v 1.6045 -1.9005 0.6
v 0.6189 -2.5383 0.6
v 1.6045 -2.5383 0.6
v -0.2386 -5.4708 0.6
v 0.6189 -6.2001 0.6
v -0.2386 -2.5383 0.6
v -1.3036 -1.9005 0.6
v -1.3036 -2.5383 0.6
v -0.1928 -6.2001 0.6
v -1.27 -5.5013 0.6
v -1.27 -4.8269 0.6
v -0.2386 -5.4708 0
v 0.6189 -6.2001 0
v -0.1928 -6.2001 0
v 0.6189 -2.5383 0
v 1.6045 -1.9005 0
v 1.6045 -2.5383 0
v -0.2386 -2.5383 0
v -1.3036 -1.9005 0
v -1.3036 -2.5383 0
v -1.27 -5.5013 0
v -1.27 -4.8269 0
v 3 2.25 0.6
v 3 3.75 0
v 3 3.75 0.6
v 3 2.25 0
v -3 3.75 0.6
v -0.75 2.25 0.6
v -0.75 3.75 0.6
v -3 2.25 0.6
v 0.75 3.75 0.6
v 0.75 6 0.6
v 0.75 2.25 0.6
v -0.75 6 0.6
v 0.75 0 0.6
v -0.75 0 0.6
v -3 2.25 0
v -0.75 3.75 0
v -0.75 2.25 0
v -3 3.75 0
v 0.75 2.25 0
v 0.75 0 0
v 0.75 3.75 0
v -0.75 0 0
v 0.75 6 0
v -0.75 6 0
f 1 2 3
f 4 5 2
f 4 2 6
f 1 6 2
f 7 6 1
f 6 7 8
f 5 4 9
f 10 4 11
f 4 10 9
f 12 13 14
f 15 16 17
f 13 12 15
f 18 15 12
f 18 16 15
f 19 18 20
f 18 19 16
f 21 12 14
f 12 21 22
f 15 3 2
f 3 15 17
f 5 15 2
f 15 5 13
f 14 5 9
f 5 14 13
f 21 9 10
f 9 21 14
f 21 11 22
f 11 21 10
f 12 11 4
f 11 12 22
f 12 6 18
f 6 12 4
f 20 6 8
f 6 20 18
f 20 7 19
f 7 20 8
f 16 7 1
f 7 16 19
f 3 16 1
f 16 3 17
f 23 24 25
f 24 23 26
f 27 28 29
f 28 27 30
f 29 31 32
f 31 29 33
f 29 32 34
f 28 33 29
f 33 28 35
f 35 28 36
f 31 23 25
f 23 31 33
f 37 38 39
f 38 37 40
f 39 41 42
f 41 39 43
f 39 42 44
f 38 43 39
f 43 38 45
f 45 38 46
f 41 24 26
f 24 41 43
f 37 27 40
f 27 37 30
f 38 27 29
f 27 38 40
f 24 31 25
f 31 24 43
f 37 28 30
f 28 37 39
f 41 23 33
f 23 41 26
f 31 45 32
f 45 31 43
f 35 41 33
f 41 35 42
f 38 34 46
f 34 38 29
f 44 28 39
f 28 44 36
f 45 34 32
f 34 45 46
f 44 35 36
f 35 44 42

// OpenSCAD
$fn = 50;

difference() {
	union() {
		translate(v = [0.0, -4.0, 0.6]) {
			rotate(a = [180, 0, 0]) {
				linear_extrude(height = 0.6) {
					text(font = "Liberation Sans:style=Bold", halign = "center", size = 4.5, text = "1", valign = "center");
				}
			}
		}
		translate(v = [-3.0, 2.25, 0]) {
			cube(size = [6, 1.5, 0.6]);
		}
		translate(v = [-0.75, 0.0, 0]) {
			cube(size = [1.5, 6, 0.6]);
		}
	}
	union();
}
